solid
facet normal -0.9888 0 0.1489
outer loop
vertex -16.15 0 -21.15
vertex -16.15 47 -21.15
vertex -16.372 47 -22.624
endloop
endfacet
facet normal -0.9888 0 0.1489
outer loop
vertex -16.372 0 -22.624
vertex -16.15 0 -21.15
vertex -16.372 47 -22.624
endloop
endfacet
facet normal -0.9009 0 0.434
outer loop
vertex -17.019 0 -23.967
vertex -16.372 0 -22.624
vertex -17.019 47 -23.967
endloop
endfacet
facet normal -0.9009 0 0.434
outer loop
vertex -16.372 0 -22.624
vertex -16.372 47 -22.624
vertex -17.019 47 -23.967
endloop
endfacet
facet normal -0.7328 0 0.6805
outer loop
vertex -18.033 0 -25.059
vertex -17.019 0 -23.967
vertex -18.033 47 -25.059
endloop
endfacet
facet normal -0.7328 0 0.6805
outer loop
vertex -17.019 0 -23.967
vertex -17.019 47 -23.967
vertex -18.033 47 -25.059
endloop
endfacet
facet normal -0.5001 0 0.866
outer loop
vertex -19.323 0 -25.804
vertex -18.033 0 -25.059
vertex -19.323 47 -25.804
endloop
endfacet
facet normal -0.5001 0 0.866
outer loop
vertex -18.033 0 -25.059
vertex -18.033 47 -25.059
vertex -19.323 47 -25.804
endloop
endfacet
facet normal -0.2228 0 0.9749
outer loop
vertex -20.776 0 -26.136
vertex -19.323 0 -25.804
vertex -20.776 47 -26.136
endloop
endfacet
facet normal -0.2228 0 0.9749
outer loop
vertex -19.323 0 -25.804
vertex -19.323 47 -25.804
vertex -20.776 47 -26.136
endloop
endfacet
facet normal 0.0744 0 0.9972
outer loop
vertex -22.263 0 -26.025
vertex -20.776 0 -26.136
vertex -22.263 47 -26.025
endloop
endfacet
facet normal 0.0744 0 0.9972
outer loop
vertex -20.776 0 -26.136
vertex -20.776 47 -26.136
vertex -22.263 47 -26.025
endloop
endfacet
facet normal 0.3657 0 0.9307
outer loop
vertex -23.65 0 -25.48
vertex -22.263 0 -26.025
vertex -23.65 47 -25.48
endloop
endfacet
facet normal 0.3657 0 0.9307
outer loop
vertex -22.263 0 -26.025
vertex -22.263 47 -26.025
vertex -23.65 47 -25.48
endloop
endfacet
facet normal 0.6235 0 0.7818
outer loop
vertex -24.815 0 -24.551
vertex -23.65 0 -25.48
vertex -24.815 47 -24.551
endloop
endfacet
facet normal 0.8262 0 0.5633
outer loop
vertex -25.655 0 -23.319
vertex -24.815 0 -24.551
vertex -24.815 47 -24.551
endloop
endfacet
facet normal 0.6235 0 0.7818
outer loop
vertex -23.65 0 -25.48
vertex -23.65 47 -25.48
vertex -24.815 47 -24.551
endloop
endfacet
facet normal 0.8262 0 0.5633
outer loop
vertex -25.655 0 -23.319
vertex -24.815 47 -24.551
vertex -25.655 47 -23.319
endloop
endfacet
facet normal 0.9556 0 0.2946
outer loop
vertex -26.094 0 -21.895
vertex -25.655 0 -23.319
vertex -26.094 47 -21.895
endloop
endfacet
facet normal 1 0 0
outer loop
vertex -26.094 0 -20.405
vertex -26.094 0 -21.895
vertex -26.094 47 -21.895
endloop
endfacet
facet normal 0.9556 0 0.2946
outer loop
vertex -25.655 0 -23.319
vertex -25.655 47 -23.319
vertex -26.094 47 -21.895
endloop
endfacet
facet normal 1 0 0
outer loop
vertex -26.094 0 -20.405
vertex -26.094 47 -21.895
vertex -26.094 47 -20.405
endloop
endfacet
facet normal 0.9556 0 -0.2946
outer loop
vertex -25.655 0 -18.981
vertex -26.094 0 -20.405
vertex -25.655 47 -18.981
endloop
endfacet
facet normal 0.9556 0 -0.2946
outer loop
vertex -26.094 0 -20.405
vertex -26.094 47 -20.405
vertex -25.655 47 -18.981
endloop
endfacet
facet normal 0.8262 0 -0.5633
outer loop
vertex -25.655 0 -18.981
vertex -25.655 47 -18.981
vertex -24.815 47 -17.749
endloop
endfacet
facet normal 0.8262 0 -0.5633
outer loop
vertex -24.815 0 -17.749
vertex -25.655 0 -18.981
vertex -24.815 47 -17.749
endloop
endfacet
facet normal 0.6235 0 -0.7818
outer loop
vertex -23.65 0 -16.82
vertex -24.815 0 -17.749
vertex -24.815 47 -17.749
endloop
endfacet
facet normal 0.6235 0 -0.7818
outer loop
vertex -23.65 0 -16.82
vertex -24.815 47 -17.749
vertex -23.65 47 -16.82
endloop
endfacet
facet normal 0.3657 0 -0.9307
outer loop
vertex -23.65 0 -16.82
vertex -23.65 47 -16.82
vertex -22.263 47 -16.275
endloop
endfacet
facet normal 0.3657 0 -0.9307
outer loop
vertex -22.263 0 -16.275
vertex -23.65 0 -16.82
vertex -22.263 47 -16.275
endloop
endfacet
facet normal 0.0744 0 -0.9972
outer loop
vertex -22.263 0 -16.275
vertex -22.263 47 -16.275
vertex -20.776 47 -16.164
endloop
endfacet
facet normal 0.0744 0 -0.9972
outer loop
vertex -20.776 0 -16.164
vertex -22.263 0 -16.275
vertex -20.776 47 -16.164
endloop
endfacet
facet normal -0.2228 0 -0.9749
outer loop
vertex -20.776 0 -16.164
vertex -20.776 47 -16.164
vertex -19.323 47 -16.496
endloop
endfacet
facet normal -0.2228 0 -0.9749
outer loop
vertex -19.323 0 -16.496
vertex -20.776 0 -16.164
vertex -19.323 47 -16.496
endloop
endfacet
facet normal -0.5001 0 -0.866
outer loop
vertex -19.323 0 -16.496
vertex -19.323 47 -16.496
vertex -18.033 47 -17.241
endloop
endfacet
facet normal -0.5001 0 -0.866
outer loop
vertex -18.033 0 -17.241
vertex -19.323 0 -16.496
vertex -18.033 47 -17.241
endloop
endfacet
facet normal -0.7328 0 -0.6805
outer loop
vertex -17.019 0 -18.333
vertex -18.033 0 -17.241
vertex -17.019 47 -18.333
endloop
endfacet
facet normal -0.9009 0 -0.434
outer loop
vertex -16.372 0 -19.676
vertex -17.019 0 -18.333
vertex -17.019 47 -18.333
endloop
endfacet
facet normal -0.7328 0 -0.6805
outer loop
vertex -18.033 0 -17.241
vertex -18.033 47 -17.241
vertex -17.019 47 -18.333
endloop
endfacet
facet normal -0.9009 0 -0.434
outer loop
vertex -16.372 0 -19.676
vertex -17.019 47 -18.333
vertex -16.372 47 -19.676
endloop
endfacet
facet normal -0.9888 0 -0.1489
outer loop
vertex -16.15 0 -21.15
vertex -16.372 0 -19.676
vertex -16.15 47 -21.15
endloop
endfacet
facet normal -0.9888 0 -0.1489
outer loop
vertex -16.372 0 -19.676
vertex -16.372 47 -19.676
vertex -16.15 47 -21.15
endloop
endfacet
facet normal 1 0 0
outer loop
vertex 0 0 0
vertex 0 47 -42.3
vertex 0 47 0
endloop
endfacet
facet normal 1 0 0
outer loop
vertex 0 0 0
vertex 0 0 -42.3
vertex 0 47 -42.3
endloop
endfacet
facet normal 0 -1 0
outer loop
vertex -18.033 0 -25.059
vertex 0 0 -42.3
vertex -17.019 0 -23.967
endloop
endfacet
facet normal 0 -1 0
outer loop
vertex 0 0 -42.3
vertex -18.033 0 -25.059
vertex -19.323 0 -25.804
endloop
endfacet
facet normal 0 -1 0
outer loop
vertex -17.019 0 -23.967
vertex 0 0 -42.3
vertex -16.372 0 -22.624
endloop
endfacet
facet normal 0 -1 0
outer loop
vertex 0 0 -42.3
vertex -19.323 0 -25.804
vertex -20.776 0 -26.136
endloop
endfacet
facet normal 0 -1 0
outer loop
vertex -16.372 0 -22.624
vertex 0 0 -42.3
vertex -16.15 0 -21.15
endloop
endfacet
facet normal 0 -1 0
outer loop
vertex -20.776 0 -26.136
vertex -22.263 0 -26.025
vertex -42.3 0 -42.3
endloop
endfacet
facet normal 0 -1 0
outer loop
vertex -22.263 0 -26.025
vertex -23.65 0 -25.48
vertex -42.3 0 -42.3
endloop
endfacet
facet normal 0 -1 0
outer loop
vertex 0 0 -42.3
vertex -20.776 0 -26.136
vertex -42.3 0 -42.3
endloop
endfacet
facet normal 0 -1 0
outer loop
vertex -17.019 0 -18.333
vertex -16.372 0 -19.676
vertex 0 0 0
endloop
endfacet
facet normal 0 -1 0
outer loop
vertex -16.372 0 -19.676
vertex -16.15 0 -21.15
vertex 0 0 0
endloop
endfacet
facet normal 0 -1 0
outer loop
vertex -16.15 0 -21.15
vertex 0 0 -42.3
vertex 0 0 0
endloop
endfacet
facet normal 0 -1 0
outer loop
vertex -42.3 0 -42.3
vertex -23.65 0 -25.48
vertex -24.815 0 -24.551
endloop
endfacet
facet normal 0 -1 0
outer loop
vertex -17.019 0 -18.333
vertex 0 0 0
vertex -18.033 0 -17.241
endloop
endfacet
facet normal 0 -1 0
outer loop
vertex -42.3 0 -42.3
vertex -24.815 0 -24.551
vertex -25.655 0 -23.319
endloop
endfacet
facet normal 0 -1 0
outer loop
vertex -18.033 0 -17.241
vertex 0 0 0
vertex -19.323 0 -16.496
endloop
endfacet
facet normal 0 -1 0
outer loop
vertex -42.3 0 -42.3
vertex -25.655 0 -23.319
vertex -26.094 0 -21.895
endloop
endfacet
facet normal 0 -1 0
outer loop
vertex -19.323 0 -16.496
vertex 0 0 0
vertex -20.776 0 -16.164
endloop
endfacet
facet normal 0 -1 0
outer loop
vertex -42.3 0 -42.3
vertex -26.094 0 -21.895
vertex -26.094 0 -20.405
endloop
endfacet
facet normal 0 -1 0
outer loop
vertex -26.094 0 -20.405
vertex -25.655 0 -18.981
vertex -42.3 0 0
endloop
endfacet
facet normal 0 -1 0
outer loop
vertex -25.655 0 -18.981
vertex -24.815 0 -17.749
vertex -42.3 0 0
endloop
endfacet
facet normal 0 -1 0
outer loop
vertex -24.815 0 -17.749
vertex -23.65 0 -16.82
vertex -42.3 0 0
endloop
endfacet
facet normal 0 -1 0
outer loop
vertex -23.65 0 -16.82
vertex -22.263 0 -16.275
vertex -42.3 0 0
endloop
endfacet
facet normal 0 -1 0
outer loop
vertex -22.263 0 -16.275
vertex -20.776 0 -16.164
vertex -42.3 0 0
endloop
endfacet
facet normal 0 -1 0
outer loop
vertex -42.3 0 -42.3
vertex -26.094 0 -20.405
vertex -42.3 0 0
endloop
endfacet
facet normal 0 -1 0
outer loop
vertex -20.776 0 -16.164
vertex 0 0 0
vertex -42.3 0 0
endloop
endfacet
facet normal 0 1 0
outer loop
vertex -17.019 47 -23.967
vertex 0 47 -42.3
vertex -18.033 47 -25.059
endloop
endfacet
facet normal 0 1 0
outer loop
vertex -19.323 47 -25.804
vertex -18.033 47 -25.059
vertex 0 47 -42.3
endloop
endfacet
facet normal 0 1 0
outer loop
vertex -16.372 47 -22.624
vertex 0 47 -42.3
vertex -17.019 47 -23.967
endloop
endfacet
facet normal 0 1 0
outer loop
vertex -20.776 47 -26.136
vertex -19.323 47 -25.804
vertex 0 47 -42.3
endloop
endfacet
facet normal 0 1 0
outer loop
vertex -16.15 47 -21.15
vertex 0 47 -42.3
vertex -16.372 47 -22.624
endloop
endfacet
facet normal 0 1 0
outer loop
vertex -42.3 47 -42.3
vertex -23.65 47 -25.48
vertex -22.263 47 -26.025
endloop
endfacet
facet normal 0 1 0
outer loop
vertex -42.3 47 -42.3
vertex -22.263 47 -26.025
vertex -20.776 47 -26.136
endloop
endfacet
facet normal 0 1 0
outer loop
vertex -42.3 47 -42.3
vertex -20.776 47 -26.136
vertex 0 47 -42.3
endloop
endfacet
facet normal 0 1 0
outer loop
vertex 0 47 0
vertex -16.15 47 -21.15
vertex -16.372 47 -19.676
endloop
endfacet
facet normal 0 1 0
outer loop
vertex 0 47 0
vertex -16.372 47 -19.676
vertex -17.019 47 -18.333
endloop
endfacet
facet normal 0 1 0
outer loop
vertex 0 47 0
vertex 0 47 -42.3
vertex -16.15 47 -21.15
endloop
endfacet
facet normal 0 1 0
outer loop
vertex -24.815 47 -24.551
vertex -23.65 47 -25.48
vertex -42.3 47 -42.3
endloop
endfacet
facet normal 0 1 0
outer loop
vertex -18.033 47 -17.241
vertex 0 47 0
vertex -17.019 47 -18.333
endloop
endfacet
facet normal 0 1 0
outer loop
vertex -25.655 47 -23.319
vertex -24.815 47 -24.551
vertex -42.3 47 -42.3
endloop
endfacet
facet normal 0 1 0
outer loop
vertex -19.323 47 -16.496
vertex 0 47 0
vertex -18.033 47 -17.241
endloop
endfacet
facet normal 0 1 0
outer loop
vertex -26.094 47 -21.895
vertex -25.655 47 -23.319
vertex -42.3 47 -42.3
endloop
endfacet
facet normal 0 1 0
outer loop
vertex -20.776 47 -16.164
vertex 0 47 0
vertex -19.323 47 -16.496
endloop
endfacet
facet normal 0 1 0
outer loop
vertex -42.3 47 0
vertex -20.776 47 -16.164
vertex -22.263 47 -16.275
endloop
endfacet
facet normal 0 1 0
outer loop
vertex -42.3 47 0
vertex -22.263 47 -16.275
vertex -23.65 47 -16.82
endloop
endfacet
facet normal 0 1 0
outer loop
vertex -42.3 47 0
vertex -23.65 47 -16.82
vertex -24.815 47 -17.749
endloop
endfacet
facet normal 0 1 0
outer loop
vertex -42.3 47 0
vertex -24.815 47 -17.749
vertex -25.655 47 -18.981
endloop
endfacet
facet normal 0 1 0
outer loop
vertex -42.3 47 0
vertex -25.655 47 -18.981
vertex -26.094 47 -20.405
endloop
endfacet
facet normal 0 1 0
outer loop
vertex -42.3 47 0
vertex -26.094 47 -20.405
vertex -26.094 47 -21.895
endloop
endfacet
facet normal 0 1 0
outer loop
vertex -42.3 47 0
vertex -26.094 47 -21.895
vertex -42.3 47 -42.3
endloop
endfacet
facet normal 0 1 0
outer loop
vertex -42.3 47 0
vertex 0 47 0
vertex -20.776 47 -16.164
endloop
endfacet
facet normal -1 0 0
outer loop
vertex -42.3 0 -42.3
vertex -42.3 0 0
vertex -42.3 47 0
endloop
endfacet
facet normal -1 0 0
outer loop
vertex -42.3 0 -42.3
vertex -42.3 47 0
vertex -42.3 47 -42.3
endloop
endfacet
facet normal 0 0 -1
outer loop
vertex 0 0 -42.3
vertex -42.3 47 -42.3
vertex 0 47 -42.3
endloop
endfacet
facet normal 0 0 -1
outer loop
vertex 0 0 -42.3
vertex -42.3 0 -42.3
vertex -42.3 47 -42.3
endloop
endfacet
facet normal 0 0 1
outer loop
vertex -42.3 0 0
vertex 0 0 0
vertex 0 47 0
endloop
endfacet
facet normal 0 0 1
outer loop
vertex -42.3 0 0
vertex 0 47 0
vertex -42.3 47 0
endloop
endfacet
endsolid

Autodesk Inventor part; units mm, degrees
ref_plane "YZ Plane" through (0, 0, 0) normal (1, 0, 0) x (0, 1, 0)
ref_plane "XZ Plane" through (0, 0, 0) normal (0, 1, 0) x (-1, 0, 0)
ref_plane "XY Plane" through (0, 0, 0) normal (0, 0, 1) x (1, 0, 0)
sketch "Skizze1" plane through (0, 0, 0) normal (0, 1, 0) x (-1, 0, 0)
  line L0 (0, 0) -> (42.3, 0)
  line L1 (42.3, 0) -> (42.3, -42.3)
  line L2 (42.3, -42.3) -> (0, -42.3)
  line L3 (0, -42.3) -> (0, 0)
  dimension "d0" = 42.3
  dimension "d1" = 42.3
extrude "Extrusion1" add sketch "Skizze1" along normal blind 47
sketch "Skizze2" plane through (0, 47, 0) normal (0, 1, 0) x (1, 0, 0)
  line L0 (-42.3, 42.3) -> (-42.3, 0) projected
  line L1 (-42.3, 21.15) -> (0, 21.15)
  line L2 (0, 0) -> (0, 42.3) projected
  line L3 (-42.3, 0) -> (0, 0) projected
  line L4 (-21.15, 0) -> (-21.15, 42.3)
  line L5 (0, 42.3) -> (-42.3, 42.3) projected
  circle A0 centre (-21.15, 21.15) radius 5
  dimension "d4" = 10
extrude "Extrusion2" cut sketch "Skizze2" against normal blind 47 contours A0 L4 L1 | L1 L4 A0 | A0 L1 L4 | L1 A0 L4
properties part number "Motor"
